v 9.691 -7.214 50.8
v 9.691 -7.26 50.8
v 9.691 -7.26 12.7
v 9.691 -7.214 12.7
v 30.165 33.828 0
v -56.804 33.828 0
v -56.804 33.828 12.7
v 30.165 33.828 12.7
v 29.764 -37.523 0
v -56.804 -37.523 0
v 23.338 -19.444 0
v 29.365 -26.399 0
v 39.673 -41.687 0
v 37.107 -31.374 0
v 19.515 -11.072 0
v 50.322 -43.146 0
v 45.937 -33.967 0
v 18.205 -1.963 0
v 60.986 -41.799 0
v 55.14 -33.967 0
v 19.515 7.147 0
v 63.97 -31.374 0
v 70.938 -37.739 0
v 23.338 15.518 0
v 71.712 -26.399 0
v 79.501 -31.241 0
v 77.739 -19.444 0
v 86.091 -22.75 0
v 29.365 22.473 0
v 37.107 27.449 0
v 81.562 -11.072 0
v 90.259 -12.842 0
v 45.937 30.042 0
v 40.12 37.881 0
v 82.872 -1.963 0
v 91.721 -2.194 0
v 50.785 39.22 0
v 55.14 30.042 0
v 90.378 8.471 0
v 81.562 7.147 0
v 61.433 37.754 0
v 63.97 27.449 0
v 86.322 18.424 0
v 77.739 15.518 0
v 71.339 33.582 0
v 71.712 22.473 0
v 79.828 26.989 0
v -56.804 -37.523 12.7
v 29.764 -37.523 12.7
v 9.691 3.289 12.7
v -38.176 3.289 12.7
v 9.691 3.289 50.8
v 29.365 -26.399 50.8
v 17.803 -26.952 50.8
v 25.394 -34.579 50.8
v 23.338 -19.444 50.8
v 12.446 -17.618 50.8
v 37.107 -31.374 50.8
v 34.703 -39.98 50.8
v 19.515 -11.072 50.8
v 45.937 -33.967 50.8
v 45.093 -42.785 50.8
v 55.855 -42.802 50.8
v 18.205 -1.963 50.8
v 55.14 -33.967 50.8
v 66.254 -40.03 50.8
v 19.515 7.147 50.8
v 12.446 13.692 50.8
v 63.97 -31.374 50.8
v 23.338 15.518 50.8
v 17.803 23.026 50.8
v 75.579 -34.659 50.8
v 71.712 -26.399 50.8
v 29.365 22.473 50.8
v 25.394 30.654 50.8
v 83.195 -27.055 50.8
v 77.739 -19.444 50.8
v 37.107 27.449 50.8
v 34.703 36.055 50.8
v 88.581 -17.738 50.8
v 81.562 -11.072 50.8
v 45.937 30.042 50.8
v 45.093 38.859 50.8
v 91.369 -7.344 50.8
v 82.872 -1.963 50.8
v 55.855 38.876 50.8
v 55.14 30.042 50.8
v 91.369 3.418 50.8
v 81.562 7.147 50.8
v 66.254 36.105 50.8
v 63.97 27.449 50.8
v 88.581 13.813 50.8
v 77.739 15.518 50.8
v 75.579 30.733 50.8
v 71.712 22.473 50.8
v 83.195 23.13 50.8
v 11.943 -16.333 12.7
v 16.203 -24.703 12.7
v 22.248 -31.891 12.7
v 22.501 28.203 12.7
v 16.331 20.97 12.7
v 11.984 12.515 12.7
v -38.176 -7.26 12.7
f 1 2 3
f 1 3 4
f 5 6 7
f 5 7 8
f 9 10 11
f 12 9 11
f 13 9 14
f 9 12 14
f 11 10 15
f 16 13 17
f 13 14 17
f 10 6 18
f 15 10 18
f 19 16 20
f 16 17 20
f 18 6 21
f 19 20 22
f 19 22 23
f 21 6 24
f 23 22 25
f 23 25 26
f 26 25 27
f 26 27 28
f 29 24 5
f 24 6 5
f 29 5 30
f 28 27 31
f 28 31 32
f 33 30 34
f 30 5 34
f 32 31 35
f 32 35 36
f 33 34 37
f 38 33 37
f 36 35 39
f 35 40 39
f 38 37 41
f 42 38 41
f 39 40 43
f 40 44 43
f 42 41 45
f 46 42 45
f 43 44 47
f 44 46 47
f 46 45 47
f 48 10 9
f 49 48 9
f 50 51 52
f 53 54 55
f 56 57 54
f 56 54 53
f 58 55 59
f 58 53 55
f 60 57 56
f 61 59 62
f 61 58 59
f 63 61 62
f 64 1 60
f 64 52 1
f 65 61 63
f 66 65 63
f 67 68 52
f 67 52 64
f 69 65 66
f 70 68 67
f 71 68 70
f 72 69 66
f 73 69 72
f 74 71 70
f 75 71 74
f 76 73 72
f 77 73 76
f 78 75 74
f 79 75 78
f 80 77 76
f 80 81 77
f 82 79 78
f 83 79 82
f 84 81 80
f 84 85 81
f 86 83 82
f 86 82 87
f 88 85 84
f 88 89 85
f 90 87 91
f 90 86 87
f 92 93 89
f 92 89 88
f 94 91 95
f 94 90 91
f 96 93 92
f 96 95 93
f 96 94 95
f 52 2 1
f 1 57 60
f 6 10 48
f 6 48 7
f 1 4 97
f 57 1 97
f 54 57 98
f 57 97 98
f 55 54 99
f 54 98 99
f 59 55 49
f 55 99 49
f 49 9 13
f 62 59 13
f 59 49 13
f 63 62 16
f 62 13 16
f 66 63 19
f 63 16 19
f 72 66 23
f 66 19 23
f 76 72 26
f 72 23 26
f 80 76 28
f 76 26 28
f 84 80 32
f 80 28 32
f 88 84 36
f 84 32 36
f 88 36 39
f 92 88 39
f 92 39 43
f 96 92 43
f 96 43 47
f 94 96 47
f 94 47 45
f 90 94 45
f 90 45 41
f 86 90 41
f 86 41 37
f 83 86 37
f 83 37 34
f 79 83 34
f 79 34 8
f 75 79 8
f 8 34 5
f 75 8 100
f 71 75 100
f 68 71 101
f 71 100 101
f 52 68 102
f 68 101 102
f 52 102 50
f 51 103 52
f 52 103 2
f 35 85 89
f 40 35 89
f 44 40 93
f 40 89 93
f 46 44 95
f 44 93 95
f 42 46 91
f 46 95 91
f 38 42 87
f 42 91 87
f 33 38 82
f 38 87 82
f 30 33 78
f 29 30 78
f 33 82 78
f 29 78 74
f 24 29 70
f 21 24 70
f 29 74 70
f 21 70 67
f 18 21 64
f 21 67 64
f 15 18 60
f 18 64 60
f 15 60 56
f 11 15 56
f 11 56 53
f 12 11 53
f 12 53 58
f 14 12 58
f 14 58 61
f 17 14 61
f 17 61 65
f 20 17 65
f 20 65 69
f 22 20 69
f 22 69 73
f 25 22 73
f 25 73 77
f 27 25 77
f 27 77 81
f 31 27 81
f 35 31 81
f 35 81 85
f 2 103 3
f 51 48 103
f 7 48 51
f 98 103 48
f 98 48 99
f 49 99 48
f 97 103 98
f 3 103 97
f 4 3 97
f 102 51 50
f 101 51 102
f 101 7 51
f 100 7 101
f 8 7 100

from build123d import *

# Parameters (mm, degrees)
F0_W      = 94.672728
F0_H      = 71.350906
F1_DEPTH  = 12.7
F3_DEPTH  = 12.701
F4_R      = 41.183466
F5_DEPTH  = 50.8
F6_R      = 32.333479
F7_DEPTH  = 50.801
F8_W      = 47.867391
F8_H      = 10.548822
F9_DEPTH  = 38.1
F11_DEPTH = 46.481614


with BuildPart() as f1:
    # F0 (on Top) → F1 (new body)
    with BuildSketch(Plane.XY):
        with Locations((-9.467272, -1.847273)):
            Rectangle(F0_W, F0_H)
    extrude(amount=F1_DEPTH)

    # F2 (on face) → F3 (cut, through all)
    with BuildSketch(Plane.XY.offset(12.7)):
        with BuildLine():
            Line((37.869092, -37.522726), (37.869092, 33.82818))
            ThreePointArc((37.869092, 33.82818), (16.340406, -1.847273), (37.869092, -37.522726))
        make_face()
    extrude(amount=-F3_DEPTH, mode=Mode.SUBTRACT)

    # F4 (on Top) → F5 (join)
    with BuildSketch(Plane.XY):
        with Locations((50.53845, -1.962727)):
            Circle(F4_R)
    extrude(amount=F5_DEPTH)

    # F6 (on face) → F7 (cut, through all)
    with BuildSketch(Plane.XY.offset(50.8)):
        with Locations((50.53845, -1.962727)):
            Circle(F6_R)
    extrude(amount=-F7_DEPTH, mode=Mode.SUBTRACT)

    # F8 (on face) → F9 (join)
    with BuildSketch(Plane.XY.offset(12.7)):
        with Locations((-14.242494, -1.985464)):
            Rectangle(F8_W, F8_H)
    extrude(amount=F9_DEPTH)

    # F10 (on face) → F11 (cut, through all)
    with BuildSketch(Plane.XZ.offset(7.259875)):
        Polygon((-38.17619, 12.7), (9.691201, 50.8), (-38.17619, 50.8), align=None)
    extrude(amount=-F11_DEPTH, mode=Mode.SUBTRACT)


solid = f1.part
